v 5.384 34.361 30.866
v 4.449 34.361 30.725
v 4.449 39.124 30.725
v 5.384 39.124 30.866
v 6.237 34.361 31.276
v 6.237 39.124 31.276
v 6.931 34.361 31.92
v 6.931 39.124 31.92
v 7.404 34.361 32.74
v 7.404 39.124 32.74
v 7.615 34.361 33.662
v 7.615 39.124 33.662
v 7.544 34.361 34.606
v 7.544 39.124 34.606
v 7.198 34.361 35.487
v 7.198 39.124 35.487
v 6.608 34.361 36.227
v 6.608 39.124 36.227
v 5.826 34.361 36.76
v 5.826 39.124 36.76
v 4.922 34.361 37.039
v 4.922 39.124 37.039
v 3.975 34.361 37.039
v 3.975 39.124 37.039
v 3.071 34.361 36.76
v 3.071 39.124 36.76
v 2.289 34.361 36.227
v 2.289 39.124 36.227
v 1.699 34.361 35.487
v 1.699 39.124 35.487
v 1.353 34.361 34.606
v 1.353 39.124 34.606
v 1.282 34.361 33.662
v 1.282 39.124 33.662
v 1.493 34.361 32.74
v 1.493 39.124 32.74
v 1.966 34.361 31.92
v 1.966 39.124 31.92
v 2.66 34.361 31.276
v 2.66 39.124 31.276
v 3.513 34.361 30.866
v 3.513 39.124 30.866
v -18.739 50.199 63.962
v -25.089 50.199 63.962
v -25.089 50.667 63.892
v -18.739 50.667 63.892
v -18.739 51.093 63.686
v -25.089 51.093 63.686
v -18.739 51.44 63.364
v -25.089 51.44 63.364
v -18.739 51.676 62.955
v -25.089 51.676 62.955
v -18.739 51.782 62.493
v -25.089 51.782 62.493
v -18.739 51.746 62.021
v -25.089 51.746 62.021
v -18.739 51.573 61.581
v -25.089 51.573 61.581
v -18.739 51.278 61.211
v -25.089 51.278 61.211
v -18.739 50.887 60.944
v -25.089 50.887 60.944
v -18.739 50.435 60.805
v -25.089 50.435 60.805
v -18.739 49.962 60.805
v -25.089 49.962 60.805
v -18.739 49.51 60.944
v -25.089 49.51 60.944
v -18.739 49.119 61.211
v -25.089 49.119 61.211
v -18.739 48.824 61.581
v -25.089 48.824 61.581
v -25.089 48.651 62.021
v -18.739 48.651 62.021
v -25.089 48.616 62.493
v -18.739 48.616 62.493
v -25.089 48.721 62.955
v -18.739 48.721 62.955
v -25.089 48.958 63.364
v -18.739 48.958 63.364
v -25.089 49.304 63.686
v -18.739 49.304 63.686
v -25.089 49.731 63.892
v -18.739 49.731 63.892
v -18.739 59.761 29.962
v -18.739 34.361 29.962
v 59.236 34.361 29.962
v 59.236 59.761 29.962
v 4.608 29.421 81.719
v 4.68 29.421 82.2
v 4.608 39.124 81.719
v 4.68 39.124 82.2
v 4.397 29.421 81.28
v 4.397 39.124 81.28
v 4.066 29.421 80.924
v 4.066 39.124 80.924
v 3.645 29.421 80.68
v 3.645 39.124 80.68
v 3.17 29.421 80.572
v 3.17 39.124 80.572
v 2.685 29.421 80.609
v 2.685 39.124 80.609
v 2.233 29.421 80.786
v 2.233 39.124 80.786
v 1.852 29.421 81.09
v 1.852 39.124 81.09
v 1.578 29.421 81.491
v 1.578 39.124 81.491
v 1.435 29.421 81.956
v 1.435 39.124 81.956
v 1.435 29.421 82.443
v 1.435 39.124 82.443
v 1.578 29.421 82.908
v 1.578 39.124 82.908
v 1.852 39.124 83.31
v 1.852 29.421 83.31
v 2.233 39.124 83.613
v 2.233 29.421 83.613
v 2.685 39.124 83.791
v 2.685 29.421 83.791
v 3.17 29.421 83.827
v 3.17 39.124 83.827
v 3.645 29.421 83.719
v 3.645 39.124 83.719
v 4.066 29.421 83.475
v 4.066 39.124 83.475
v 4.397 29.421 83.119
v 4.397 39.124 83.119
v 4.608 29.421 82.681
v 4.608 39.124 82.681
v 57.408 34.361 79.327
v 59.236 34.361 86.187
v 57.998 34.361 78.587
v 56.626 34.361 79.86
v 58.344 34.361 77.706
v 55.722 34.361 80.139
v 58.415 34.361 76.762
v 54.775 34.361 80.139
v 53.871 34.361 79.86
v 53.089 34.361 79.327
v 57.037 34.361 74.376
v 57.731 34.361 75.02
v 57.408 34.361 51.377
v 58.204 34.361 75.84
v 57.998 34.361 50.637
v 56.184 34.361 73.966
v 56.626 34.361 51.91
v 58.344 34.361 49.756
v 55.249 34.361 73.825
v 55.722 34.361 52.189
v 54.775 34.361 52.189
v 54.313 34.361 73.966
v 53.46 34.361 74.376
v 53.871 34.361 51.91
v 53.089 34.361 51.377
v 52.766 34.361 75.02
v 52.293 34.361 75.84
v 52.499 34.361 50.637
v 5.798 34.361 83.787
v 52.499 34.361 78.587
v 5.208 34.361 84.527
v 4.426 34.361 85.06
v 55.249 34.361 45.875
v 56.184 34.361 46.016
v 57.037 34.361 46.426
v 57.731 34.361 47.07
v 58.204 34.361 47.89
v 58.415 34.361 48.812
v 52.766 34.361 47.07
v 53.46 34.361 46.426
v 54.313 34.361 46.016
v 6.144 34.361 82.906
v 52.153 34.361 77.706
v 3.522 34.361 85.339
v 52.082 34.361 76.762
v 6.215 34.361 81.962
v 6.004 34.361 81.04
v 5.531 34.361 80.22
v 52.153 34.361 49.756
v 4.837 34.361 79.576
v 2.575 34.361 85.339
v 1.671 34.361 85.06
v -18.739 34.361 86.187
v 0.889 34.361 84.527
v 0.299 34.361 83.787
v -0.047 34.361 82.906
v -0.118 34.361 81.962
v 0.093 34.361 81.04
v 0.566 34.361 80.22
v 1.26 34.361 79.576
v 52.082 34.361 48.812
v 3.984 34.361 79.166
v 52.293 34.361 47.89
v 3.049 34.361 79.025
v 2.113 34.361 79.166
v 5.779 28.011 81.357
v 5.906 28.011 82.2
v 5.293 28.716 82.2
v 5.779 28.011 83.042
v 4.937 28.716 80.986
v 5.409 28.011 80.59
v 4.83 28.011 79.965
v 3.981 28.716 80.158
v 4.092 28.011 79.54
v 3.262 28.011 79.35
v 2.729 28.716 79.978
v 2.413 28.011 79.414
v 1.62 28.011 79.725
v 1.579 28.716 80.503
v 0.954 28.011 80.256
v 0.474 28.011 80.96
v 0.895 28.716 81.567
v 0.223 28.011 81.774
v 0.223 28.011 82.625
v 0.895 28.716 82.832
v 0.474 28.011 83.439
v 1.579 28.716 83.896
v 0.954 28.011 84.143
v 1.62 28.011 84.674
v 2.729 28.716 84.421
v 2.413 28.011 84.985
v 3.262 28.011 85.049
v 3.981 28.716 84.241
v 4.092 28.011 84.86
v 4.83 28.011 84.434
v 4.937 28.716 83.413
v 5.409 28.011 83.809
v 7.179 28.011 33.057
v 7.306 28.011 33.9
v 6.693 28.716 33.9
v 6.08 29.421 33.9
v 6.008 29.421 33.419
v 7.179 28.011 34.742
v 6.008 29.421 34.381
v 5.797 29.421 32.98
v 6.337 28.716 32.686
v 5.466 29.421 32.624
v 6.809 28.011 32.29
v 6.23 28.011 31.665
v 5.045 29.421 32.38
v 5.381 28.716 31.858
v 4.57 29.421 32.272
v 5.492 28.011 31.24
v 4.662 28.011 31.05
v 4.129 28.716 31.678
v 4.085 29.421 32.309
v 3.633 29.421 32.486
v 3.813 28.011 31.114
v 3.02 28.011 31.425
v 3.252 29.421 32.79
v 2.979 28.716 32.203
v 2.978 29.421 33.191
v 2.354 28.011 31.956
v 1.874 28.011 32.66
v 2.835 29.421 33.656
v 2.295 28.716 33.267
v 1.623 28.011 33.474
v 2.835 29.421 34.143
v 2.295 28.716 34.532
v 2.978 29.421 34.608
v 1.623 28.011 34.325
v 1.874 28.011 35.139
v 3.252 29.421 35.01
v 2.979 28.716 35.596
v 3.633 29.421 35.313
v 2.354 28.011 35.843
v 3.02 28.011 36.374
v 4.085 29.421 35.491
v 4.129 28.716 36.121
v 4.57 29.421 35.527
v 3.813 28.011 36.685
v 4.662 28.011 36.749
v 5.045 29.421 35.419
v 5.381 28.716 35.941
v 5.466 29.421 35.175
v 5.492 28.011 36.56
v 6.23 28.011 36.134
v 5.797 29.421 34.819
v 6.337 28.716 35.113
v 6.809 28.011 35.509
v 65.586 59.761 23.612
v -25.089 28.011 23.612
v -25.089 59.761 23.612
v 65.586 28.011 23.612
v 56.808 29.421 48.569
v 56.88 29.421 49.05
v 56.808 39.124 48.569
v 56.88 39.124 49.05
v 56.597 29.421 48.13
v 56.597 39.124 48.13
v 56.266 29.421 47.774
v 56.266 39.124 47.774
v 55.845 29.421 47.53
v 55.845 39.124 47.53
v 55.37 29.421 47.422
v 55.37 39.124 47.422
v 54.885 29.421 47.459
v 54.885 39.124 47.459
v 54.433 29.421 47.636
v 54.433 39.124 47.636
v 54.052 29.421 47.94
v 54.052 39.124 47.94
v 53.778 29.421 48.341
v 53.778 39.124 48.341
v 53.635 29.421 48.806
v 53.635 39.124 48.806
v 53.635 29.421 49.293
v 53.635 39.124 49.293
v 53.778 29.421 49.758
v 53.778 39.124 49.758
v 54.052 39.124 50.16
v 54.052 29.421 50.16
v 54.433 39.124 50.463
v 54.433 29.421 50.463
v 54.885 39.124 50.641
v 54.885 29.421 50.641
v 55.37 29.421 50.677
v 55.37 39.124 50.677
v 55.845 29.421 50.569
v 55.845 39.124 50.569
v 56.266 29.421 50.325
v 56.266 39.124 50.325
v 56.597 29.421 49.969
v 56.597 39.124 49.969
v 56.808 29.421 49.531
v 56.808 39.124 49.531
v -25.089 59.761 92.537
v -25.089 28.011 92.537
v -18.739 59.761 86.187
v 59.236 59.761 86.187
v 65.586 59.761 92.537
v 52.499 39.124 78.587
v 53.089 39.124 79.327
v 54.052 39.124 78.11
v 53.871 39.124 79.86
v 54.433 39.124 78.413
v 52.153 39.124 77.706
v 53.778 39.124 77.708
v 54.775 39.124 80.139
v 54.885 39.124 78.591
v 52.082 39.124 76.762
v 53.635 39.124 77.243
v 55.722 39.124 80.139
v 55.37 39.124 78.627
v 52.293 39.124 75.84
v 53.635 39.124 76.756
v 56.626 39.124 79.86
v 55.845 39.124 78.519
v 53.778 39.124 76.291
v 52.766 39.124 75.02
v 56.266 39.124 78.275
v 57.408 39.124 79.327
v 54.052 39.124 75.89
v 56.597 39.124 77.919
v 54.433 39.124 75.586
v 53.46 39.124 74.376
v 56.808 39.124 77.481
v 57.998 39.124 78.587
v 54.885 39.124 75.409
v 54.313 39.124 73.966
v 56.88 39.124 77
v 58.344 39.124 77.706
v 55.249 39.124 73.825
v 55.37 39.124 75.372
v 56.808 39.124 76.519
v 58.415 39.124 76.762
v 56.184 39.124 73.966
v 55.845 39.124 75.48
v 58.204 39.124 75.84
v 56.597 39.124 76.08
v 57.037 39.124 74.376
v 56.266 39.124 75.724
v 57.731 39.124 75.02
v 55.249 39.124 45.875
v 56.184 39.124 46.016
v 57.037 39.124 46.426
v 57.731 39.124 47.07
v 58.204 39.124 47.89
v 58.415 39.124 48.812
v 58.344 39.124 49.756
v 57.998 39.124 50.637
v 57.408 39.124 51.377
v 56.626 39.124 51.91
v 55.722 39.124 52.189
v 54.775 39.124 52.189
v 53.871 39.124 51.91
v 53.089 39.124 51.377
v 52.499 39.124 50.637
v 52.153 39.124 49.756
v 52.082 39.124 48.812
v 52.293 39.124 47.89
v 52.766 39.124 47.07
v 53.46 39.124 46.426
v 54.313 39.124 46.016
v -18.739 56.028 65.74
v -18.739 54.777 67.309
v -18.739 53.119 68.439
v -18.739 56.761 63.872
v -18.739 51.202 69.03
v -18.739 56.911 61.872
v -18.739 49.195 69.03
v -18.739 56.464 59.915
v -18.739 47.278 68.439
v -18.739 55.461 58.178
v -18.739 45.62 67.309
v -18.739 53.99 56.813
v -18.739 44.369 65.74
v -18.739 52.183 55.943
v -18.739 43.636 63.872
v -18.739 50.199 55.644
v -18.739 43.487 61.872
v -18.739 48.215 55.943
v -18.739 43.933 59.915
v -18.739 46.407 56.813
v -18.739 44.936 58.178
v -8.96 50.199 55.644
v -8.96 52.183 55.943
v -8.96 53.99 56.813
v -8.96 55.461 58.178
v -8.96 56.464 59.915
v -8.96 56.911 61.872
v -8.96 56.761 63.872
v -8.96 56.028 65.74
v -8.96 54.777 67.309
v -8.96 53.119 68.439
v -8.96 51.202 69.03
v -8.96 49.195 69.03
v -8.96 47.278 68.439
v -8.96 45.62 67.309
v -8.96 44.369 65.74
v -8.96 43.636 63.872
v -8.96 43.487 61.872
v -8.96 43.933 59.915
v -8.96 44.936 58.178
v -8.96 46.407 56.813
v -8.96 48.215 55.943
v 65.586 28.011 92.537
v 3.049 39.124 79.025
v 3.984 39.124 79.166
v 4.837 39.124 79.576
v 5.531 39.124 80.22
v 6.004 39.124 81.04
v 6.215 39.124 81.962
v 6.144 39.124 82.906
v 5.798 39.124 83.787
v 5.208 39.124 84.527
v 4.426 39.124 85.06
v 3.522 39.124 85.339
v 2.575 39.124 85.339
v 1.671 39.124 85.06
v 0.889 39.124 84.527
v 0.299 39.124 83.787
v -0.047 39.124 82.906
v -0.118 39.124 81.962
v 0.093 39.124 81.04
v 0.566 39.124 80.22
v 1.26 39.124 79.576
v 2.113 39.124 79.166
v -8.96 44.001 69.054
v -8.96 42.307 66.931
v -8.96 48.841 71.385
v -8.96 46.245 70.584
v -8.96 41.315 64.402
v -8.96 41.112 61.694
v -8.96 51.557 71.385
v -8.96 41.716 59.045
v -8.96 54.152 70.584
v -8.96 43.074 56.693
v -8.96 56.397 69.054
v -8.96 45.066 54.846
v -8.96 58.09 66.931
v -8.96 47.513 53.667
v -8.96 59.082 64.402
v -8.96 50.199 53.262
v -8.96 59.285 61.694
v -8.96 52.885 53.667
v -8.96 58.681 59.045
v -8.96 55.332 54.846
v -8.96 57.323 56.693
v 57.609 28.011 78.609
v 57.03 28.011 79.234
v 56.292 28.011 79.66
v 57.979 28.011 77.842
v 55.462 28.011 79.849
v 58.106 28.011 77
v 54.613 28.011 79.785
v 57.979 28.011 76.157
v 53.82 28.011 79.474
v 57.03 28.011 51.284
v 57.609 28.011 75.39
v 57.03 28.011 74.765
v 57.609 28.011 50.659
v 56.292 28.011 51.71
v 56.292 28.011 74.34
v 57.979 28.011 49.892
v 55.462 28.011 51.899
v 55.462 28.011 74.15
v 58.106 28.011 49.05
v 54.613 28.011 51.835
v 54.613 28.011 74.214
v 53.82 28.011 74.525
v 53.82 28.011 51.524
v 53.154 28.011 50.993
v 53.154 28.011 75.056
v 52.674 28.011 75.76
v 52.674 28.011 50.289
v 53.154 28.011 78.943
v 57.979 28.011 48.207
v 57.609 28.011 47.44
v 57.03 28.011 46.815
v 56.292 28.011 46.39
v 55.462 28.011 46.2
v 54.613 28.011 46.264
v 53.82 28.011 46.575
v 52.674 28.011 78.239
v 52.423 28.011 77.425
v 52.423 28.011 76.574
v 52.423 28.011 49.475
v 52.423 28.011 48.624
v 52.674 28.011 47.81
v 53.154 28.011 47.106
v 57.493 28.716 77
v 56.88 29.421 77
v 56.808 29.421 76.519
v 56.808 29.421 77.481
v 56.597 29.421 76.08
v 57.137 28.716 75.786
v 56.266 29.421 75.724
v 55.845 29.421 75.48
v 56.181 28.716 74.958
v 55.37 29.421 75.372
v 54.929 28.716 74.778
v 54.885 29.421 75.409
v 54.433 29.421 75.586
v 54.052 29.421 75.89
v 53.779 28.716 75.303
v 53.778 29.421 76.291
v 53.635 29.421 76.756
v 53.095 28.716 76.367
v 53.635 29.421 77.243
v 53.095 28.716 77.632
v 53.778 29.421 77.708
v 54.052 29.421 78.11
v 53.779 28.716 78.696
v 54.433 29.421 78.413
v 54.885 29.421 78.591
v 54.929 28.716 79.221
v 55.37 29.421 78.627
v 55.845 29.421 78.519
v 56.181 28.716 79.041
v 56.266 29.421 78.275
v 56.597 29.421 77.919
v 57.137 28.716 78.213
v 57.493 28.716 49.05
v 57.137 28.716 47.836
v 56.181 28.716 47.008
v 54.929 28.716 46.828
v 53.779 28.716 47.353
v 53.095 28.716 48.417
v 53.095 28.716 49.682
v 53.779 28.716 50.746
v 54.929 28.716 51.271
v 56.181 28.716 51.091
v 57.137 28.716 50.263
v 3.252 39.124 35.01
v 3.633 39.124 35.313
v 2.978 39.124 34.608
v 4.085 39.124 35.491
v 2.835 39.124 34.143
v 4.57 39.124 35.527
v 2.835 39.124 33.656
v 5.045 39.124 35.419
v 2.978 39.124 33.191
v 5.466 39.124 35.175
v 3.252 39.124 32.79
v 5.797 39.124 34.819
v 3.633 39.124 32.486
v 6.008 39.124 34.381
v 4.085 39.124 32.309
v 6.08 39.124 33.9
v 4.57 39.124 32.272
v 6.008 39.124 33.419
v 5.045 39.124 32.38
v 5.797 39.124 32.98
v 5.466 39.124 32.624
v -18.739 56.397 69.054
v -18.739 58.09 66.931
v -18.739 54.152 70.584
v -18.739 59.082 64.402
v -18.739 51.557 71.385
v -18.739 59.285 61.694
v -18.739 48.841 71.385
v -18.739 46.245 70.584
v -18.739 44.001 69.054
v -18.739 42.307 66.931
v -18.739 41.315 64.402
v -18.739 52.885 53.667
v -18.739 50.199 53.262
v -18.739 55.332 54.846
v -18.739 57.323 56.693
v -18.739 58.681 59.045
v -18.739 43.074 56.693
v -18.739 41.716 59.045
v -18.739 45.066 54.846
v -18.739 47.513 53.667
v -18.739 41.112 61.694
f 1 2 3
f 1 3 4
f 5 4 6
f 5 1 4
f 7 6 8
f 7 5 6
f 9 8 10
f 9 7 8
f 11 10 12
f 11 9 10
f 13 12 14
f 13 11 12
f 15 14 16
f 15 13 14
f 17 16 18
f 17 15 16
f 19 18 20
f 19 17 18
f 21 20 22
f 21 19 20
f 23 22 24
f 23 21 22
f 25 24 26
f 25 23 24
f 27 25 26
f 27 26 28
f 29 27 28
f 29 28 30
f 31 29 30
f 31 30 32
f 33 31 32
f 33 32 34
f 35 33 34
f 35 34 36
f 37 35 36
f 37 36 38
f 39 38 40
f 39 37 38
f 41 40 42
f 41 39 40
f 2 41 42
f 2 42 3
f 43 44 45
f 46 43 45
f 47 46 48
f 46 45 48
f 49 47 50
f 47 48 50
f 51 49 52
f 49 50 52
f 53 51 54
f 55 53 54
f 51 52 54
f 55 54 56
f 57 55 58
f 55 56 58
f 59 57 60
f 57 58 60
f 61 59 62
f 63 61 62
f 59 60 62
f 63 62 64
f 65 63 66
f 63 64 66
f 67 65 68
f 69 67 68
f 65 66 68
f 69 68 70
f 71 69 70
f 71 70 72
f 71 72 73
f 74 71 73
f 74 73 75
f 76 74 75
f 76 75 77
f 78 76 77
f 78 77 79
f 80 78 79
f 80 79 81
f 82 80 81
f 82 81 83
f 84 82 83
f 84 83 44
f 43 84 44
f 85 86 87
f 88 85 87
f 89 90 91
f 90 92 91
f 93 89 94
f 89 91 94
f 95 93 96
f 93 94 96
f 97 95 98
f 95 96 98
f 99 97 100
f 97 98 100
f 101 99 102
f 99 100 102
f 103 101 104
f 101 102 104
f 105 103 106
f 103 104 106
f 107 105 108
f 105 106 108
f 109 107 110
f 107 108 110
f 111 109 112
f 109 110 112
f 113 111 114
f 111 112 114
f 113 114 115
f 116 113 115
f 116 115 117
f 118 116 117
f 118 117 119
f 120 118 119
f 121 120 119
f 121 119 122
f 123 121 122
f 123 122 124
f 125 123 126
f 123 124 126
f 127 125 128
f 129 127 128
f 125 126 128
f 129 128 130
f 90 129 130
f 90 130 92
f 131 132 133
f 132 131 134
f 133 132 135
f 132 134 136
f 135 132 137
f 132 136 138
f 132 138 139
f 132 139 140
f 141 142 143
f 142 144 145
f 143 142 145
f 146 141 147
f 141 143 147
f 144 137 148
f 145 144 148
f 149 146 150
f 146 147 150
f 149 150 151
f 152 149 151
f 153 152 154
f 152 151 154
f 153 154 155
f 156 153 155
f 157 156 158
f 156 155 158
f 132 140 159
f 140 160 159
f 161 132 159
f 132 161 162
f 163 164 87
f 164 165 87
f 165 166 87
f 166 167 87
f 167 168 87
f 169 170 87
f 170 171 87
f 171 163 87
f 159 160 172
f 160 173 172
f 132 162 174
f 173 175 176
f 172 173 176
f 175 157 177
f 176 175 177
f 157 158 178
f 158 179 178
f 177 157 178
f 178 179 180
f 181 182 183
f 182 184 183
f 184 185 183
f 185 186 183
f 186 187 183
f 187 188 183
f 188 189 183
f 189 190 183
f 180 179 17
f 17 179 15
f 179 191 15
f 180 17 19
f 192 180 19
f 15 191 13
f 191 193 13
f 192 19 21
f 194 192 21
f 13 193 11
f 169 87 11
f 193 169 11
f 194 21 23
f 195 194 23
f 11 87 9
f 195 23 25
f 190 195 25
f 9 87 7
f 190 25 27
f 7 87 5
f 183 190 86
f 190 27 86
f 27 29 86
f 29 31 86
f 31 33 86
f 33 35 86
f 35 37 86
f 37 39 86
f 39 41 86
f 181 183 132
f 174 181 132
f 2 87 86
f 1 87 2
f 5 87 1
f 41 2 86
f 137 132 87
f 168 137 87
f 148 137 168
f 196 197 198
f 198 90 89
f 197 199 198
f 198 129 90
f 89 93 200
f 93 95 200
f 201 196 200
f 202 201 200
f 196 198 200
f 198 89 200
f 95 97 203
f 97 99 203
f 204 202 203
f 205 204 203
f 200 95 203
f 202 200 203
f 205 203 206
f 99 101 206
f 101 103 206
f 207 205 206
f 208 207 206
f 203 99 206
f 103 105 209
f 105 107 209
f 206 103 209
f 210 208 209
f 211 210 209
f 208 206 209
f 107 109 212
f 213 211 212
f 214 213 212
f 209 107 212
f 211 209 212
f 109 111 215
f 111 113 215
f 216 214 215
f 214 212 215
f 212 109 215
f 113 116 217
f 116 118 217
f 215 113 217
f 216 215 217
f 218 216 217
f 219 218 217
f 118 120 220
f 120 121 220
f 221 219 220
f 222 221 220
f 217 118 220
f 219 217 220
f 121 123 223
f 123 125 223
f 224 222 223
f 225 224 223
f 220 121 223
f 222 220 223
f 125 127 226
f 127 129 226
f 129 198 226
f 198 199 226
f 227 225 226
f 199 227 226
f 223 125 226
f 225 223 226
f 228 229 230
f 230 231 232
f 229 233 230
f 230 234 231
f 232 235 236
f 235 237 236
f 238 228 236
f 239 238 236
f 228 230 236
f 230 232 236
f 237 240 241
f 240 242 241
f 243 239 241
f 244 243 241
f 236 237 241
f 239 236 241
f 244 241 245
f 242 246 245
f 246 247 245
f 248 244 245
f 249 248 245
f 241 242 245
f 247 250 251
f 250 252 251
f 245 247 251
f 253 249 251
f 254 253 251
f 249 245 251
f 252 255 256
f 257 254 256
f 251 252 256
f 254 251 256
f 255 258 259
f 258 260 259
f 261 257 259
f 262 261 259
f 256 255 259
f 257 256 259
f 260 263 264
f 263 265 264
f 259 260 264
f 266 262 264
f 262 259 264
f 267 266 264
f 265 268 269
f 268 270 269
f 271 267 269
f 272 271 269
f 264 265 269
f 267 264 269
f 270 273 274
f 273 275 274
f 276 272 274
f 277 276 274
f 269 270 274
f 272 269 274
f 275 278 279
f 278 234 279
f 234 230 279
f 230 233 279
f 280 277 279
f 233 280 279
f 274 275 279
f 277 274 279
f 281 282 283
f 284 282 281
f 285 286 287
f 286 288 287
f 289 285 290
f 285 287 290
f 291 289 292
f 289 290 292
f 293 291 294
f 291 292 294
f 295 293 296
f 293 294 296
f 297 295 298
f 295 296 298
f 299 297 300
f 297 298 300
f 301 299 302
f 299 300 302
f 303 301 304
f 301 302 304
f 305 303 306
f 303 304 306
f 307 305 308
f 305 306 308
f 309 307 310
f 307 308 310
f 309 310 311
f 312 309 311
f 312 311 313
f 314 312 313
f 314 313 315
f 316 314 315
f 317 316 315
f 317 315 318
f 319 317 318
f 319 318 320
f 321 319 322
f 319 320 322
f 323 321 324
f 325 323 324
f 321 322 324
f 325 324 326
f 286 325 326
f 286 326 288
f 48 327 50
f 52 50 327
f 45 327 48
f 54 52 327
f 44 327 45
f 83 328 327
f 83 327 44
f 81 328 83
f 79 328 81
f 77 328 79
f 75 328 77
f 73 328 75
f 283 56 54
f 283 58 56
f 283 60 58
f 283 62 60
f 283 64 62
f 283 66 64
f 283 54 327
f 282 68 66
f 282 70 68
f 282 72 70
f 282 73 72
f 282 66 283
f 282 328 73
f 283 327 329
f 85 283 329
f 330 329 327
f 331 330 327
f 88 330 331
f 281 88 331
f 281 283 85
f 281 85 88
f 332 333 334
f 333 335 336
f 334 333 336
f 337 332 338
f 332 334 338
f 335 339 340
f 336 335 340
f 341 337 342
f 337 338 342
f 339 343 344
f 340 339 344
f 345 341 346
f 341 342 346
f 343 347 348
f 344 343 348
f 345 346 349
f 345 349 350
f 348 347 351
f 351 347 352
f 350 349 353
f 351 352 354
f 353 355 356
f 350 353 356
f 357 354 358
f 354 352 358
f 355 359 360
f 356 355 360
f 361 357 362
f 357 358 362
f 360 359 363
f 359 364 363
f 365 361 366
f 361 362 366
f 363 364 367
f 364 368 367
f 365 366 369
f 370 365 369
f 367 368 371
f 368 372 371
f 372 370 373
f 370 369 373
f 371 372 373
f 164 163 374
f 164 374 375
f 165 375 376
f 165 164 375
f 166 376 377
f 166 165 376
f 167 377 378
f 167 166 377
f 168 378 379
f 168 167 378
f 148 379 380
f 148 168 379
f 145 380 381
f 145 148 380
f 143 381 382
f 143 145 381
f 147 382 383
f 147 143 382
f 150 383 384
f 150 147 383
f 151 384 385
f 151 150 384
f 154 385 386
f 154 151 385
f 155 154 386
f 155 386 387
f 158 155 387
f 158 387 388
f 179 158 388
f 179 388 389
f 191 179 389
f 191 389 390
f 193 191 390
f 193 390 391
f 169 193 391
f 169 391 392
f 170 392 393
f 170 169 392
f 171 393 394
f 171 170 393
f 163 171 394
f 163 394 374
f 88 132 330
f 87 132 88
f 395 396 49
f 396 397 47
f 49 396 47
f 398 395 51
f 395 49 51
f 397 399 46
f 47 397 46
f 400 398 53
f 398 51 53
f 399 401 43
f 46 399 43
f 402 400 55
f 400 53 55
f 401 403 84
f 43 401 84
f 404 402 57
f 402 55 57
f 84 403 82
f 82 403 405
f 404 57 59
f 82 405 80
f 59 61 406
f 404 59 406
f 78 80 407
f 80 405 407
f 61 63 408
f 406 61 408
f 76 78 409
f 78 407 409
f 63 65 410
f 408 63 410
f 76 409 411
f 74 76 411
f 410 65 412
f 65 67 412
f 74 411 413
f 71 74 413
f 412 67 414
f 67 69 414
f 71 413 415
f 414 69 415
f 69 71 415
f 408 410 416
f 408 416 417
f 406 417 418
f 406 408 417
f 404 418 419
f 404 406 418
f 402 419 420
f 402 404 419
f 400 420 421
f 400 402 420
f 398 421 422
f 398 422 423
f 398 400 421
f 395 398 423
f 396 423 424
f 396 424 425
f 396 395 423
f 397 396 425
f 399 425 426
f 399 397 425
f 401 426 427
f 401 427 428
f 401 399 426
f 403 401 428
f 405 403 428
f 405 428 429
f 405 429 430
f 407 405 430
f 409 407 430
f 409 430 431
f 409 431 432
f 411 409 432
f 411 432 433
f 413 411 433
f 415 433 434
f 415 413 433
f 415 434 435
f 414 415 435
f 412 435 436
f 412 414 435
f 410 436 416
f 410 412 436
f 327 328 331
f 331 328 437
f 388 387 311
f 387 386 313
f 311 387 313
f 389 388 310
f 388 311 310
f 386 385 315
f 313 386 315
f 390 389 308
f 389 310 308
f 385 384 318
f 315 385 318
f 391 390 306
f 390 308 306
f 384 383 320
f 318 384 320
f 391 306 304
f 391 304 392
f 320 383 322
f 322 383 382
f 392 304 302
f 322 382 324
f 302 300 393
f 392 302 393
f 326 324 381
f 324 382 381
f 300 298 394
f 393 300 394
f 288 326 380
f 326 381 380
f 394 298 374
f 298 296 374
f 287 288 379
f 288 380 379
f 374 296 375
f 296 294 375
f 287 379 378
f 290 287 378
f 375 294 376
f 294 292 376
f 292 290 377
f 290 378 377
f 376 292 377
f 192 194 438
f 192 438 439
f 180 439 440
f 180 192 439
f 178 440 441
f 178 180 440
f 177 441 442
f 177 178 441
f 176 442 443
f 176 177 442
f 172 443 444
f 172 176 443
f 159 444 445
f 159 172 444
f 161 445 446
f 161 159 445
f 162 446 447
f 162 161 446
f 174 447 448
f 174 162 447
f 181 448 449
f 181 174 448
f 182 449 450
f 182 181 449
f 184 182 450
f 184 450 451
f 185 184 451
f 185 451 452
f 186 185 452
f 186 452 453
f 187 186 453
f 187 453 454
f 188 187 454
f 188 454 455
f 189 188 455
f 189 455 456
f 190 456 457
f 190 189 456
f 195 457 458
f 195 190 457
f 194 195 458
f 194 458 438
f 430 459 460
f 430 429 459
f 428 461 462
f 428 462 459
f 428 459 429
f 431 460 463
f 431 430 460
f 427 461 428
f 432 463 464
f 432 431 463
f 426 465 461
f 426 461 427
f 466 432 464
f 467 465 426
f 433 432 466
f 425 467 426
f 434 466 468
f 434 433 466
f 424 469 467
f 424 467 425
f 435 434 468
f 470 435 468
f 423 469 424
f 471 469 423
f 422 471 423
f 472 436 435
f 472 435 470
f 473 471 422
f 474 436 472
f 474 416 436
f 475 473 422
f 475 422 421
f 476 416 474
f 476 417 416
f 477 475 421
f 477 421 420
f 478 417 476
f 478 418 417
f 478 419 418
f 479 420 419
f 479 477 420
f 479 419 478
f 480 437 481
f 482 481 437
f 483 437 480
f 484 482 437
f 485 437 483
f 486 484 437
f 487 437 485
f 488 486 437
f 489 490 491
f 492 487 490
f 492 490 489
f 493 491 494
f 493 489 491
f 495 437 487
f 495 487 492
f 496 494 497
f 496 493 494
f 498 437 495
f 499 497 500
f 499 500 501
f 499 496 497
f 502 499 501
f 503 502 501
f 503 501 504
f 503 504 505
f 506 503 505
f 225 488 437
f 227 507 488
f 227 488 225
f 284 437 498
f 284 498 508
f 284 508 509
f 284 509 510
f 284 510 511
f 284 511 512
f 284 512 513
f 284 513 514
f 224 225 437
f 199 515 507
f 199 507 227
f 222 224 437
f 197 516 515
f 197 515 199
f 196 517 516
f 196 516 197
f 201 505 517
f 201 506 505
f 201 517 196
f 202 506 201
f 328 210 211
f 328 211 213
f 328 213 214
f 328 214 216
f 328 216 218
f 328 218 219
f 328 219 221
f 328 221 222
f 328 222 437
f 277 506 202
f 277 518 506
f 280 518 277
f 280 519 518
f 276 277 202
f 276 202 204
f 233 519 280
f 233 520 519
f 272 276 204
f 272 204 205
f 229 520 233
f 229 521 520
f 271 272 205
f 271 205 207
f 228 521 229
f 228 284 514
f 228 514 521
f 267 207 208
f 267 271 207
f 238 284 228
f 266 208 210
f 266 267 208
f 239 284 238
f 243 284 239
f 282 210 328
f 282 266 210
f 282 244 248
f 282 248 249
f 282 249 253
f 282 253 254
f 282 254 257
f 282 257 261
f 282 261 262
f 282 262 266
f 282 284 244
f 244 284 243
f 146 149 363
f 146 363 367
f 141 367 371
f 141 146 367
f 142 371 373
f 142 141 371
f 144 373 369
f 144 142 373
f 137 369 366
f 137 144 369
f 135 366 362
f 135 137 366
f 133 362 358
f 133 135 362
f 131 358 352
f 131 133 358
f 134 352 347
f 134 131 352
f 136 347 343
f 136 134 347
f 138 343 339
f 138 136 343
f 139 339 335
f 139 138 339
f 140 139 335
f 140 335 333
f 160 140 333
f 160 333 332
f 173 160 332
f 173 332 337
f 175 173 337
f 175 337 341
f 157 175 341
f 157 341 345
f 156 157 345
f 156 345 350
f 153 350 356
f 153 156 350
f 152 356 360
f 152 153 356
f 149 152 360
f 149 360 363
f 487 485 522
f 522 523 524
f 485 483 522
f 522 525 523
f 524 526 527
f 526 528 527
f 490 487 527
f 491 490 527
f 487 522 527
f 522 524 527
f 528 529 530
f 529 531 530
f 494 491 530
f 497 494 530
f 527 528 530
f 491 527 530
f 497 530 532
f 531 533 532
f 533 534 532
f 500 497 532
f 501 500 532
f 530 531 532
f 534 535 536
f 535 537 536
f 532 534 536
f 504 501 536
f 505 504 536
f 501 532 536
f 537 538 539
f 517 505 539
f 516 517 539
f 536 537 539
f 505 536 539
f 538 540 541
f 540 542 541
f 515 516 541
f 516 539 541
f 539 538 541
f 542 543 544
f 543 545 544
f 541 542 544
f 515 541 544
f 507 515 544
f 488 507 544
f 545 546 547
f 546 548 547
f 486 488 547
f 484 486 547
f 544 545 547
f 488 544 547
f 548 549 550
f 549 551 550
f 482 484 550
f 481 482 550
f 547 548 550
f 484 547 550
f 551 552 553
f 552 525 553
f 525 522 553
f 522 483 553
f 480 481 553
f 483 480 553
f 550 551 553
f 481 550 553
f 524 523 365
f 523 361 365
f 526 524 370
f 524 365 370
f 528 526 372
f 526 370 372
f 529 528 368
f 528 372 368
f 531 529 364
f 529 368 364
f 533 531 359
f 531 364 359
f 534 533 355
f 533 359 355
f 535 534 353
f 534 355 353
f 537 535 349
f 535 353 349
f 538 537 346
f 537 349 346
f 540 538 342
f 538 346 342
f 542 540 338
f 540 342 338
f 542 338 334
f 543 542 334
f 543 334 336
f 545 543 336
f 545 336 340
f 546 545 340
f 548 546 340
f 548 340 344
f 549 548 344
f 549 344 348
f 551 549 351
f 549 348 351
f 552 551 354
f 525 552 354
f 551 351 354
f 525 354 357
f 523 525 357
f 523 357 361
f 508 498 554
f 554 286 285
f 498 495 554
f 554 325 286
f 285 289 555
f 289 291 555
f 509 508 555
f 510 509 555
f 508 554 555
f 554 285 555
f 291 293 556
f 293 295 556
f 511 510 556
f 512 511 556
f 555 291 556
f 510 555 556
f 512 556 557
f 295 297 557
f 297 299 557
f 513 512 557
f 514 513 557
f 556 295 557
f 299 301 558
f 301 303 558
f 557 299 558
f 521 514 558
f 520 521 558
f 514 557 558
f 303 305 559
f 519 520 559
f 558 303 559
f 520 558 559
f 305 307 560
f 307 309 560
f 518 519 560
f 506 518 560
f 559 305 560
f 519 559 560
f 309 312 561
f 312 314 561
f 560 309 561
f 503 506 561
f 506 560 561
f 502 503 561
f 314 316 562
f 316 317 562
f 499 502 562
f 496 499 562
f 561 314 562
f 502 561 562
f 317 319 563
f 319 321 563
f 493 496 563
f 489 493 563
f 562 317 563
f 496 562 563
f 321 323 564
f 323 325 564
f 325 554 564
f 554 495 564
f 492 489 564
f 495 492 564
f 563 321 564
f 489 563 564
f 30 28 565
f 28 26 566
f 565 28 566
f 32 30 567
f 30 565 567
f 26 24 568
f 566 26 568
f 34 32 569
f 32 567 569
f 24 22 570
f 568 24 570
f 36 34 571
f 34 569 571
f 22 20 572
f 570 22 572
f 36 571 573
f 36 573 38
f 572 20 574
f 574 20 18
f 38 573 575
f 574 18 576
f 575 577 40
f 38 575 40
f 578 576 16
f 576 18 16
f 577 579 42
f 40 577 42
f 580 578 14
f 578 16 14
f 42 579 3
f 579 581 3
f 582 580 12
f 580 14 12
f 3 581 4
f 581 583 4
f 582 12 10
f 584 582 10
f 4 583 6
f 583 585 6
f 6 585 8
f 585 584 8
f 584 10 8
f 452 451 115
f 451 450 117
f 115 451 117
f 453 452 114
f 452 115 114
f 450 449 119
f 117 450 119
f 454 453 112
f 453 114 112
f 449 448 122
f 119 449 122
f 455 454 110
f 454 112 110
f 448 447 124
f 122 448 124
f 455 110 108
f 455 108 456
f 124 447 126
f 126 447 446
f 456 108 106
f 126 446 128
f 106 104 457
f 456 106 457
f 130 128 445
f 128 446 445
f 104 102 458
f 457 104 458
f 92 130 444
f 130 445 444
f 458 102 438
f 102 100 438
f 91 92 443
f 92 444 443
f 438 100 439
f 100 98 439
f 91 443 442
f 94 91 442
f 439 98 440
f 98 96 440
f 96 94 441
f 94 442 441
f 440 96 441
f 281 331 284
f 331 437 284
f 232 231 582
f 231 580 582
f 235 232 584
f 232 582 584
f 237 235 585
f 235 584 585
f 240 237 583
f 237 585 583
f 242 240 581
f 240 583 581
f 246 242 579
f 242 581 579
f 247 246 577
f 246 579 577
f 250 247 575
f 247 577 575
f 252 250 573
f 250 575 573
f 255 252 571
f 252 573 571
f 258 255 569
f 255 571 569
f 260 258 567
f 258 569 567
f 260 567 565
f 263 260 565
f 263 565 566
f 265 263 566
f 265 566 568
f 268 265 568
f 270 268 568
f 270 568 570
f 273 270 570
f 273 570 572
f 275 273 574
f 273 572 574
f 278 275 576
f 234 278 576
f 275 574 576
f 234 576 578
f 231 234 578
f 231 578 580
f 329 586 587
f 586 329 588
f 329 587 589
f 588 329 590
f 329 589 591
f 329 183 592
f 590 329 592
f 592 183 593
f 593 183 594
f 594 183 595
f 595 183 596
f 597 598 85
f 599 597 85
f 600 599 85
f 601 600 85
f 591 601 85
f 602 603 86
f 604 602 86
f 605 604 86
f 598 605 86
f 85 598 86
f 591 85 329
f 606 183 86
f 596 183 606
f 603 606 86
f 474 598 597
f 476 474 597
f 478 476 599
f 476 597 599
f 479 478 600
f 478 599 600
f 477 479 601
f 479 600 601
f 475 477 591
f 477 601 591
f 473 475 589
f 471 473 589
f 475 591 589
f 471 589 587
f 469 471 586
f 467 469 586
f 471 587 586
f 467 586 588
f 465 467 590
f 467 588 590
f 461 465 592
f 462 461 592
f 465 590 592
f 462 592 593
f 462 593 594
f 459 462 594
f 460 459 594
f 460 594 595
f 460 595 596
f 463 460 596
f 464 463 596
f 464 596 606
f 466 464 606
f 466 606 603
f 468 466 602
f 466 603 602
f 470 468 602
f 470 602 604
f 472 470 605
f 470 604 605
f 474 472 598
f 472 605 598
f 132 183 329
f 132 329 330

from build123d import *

# Parameters (mm, degrees)
SKETCH2_W                                      = 90.675
SKETCH2_H                                      = 68.925
BOSS_EXTRUDE1_DEPTH                            = 6.35
SKETCH3_R                                      = 3.175
BOSS_EXTRUDE2_DEPTH                            = 4.7625
CSK_FOR_4_FLAT_HEAD_MACHINE_SCREW1_D           = 3.2639
CSK_FOR_4_FLAT_HEAD_MACHINE_SCREW1_CSINK_D     = 5.715
CSK_FOR_4_FLAT_HEAD_MACHINE_SCREW1_CSINK_ANGLE = 82
SKETCH10_W                                     = 90.675
SKETCH10_H                                     = 68.925
SKETCH10_W_2                                   = 77.975
SKETCH10_H_2                                   = 56.225
BOSS_EXTRUDE4_DEPTH                            = 25.4
SKETCH11_R                                     = 9.11225
SKETCH11_R_2                                   = 6.731
BOSS_EXTRUDE5_DEPTH                            = 9.779
CUT_EXTRUDE1_REACH                             = 144.676
SKETCH12_R                                     = 1.5875


with BuildPart() as part:
    # Sketch2 → Boss-Extrude1 (new body)
    with BuildSketch(Plane(origin=(0, 34.361183362, 0), x_dir=(-1, 0, 0), z_dir=(0, -1, 0))):
        with Locations((-20.248501783, -58.074565381)):
            Rectangle(SKETCH2_W, SKETCH2_H)
    extrude(amount=BOSS_EXTRUDE1_DEPTH)

    # Sketch3 → Boss-Extrude2 (add)
    with BuildSketch(Plane(origin=(0, 34.361183362, 0), x_dir=(-1, 0, 0), z_dir=(0, -1, 0))):
        with Locations(Location((-4.448501783, -33.899565381, 0), (0, 0, 90))):
            Circle(SKETCH3_R)
        with Locations(Location((-55.248501783, -49.049565381, 0), (0, 0, 90))):
            Circle(SKETCH3_R)
        with Locations(Location((-55.248501783, -76.999565381, 0), (0, 0, 90))):
            Circle(SKETCH3_R)
        with Locations(Location((-3.048501783, -82.199565381, 0), (0, 0, 90))):
            Circle(SKETCH3_R)
    extrude(amount=-BOSS_EXTRUDE2_DEPTH)

    # CSK for #4 Flat Head Machine Screw1 (through all)
    with Locations(Plane(origin=(0, 28.011183362, 0), x_dir=(-1, 0, 0), z_dir=(0, -1, 0))):
        with Locations((-3.048501783, -82.199565381), (-55.248501783, -76.999565381), (-55.248501783, -49.049565381), (-4.448501783, -33.899565381)):
            CounterSinkHole(CSK_FOR_4_FLAT_HEAD_MACHINE_SCREW1_D / 2, CSK_FOR_4_FLAT_HEAD_MACHINE_SCREW1_CSINK_D / 2, counter_sink_angle=CSK_FOR_4_FLAT_HEAD_MACHINE_SCREW1_CSINK_ANGLE)

    # Sketch10 → Boss-Extrude4 (add)
    with BuildSketch(Plane(origin=(0, 34.361183362, 0), x_dir=(1, 0, 0), z_dir=(0, 1, 0))):
        with Locations((20.248501783, -58.074565381)):
            Rectangle(SKETCH10_W, SKETCH10_H)
        with Locations((20.248501783, -58.074565381)):
            Rectangle(SKETCH10_W_2, SKETCH10_H_2, mode=Mode.SUBTRACT)
    extrude(amount=BOSS_EXTRUDE4_DEPTH)

    # Sketch11 → Boss-Extrude5 (add)
    with BuildSketch(Plane(origin=(-18.738998217, 0, 0), x_dir=(0, 0, -1), z_dir=(1, 0, 0))):
        with Locations((-62.374565381, 50.198683362)):
            Circle(SKETCH11_R)
        with Locations((-62.374565381, 50.198683362)):
            Circle(SKETCH11_R_2, mode=Mode.SUBTRACT)
    extrude(amount=BOSS_EXTRUDE5_DEPTH)

    # Sketch12 → Cut-Extrude1 (cut, up to next)
    with BuildSketch(Plane.ZY.offset(25.088998217), mode=Mode.PRIVATE) as cut_extrude1_sk1:
        with Locations((62.374565381, 50.198683362)):
            Circle(SKETCH12_R)
    cut_extrude1_tool1 = extrude(cut_extrude1_sk1.sketch, amount=-CUT_EXTRUDE1_REACH, mode=Mode.PRIVATE) & part.part
    add(cut_extrude1_tool1.solids().sort_by_distance((-25.088998, 50.198683, 62.374565))[0], mode=Mode.SUBTRACT)


solid = part.part
